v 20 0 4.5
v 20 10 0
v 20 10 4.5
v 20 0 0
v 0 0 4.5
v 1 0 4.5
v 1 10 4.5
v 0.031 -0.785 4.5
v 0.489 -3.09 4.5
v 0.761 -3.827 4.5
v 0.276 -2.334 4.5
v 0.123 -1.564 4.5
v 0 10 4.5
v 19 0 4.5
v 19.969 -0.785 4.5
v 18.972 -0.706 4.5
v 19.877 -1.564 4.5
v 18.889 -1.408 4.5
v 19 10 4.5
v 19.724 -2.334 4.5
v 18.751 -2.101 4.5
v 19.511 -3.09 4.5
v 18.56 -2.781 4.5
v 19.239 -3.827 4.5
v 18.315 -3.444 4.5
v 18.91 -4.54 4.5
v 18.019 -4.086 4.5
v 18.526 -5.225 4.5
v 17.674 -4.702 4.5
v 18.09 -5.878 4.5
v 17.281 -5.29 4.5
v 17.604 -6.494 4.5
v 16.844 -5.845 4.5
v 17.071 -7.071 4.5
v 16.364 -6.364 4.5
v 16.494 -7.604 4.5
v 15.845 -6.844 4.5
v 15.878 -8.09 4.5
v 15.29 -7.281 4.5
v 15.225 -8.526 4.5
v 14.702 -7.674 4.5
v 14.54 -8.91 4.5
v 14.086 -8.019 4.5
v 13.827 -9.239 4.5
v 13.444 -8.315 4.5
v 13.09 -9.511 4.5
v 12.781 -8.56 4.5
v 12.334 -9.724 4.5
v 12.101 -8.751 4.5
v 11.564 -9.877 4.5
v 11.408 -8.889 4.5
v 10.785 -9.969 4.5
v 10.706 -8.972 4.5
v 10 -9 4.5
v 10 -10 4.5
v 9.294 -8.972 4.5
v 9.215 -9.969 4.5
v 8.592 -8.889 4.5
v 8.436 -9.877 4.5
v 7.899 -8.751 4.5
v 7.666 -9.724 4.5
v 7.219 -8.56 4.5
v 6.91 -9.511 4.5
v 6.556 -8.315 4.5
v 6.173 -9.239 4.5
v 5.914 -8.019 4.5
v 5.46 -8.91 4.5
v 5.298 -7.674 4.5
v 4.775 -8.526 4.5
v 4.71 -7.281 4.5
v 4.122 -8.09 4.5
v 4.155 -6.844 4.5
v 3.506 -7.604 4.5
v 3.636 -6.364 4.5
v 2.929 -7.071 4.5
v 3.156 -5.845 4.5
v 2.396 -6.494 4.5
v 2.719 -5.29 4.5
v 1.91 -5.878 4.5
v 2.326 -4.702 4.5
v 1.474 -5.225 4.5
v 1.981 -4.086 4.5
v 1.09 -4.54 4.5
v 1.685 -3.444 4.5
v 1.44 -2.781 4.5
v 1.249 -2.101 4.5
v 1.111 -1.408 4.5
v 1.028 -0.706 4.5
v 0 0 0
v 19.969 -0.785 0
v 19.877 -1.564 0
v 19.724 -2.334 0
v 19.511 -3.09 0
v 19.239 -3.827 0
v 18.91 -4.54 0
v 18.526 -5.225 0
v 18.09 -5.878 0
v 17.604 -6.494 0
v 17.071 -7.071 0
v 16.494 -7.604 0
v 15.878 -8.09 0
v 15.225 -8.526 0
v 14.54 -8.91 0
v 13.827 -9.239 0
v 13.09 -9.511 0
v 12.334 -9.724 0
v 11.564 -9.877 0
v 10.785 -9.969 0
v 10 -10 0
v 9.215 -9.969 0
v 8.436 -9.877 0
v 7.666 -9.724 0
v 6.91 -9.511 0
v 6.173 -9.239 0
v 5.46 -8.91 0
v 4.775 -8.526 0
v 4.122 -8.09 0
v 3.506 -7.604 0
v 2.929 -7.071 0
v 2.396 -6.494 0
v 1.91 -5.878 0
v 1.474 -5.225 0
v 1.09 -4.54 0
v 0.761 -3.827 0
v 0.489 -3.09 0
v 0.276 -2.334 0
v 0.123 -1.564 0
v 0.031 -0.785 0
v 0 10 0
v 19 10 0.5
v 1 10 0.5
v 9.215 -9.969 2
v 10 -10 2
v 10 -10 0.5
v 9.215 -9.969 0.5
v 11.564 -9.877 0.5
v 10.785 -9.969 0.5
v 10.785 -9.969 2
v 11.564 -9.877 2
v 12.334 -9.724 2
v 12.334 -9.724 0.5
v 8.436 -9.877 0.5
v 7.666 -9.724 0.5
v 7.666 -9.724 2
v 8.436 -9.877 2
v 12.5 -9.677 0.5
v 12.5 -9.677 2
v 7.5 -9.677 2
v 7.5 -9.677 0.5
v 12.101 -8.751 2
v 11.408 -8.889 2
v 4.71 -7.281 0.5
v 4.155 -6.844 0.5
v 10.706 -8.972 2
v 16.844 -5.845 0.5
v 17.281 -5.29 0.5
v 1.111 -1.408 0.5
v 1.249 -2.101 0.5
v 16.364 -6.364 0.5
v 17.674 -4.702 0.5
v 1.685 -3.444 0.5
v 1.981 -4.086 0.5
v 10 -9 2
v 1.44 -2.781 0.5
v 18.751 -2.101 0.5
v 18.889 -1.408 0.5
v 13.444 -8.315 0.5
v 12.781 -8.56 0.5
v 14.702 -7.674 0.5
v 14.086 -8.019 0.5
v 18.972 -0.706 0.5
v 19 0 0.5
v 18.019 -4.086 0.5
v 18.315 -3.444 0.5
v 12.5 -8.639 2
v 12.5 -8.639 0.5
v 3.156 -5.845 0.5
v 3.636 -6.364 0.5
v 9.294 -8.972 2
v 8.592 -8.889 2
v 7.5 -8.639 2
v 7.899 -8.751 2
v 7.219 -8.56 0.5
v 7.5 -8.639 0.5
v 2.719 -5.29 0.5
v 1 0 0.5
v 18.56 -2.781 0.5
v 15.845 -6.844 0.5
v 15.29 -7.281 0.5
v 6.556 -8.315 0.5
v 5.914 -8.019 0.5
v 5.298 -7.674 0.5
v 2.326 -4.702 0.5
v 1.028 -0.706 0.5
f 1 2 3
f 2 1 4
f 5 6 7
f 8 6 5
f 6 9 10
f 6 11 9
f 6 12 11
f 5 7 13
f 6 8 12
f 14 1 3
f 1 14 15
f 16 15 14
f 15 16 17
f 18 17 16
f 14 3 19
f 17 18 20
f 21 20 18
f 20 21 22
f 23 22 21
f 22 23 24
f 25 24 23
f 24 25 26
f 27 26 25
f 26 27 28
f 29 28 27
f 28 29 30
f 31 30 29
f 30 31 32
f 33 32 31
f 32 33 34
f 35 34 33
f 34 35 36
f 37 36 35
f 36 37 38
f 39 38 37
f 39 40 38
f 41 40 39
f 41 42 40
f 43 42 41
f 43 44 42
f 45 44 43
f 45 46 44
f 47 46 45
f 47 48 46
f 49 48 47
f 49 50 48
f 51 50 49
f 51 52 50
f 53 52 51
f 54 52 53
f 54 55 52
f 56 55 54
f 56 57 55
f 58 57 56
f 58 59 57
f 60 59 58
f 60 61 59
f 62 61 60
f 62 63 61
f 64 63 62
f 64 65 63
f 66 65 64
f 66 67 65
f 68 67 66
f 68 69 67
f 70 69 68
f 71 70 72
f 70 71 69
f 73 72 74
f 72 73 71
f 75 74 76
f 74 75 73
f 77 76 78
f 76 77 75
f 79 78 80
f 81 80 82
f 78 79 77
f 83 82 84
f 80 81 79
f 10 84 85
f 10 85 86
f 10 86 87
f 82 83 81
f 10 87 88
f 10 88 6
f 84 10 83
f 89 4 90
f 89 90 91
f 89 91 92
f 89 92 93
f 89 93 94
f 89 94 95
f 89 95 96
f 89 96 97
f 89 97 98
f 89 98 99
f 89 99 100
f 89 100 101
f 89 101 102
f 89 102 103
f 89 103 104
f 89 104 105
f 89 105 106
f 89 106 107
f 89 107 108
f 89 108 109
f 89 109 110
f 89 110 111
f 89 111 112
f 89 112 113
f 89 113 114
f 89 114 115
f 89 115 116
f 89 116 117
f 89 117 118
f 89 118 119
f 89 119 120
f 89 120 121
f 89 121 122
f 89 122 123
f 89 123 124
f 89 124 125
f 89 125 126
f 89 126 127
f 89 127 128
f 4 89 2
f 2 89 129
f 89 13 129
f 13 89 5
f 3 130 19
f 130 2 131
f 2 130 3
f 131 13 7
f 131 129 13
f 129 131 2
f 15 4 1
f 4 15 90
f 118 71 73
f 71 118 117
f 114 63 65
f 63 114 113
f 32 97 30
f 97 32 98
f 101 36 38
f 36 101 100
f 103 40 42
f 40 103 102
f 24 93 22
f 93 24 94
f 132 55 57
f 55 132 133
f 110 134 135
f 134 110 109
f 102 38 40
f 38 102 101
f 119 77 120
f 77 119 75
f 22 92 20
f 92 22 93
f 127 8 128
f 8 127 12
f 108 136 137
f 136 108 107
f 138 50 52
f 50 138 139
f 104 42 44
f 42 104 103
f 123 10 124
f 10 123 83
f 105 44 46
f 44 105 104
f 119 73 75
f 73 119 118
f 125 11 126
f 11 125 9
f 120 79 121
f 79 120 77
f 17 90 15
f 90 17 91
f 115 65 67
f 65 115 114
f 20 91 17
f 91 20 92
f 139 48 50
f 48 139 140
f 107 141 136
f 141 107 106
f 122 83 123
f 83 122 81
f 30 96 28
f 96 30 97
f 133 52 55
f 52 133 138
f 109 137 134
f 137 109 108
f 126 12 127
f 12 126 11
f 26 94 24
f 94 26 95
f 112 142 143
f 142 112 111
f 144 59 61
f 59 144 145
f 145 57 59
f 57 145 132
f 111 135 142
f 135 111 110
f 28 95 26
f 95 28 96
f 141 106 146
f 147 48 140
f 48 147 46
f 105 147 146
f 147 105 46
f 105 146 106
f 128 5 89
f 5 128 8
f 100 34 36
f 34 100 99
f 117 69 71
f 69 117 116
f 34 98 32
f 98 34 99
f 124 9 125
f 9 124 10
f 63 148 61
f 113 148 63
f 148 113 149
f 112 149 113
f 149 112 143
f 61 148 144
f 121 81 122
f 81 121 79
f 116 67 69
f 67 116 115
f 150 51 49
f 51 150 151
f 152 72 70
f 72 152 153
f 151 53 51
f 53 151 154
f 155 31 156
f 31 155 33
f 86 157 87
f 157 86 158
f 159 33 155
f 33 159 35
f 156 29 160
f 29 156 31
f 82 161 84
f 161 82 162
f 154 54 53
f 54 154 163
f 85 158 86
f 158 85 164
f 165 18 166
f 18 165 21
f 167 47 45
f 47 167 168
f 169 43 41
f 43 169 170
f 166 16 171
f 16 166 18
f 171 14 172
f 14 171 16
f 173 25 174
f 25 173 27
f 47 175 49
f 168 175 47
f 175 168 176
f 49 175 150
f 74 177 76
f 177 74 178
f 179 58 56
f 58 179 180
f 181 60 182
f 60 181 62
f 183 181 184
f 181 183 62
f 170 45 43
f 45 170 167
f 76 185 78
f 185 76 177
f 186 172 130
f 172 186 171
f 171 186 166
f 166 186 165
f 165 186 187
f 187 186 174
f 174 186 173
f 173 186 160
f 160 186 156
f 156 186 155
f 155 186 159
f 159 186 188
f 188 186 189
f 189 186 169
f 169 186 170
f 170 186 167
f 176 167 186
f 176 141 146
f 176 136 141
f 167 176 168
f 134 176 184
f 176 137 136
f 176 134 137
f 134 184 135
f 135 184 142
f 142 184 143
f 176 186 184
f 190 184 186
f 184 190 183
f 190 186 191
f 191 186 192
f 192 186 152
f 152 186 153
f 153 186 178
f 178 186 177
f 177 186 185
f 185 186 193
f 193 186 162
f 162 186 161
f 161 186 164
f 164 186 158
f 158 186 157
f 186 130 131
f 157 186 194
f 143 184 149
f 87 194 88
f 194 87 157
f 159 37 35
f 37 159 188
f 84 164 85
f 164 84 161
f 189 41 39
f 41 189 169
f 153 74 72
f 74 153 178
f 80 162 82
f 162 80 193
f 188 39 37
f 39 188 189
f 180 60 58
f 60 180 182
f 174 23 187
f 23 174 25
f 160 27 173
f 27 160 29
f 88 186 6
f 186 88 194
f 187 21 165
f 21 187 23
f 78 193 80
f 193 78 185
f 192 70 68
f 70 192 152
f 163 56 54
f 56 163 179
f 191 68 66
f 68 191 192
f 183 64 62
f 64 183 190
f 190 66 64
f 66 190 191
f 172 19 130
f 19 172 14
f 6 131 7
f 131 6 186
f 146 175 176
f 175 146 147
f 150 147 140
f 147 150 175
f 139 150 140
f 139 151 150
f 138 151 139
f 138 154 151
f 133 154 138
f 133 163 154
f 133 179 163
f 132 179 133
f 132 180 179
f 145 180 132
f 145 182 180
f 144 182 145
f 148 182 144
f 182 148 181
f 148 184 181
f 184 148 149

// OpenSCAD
// file: oledPanel.scad
// Oled screen panel

// Screen dimensions (may vary a little)
screenX = 28.5;
screenY = 27.5;

// Dimensions between holes axis
xInterHole = 23.7;
yInterHole = 24.4;

// Dimensions of the window in the panel
xWindow = 27;
yWindow = 15;
yWindowoffset = 1.5;

// Some offset
xHoleCenter = 0.1;
yHoleCenter = 0;

//rWindowPanel(45, 45, 2, 6);
//windowPanel(45, 45, 2, 6);

module rWindowPanel(x, y, z, yOffset) {
  translate([y/2, x/2, 0])
    rotate(90, [0, 0, 1])
      translate([-x/2, -y/2, 0])
        windowPanel(x, y, z, yOffset);
}

module windowPanel(x, y, z, yOffset) {
  xPanel = x;
  yPanel = y;
  zPanel = z;
  
  difference() {
    oledPanel(xPanel, yPanel, zPanel, yOffset);
    translate([(xPanel - xWindow)/2, (yPanel - yWindow)/2 + yWindowoffset + yOffset, -zPanel/2]) {
      // opening
      cube([xWindow, yWindow, 2 * zPanel]);  
    }
  }
}


module oledPanel(xPanel, yPanel, zPanel, yOffset) {   
  xMargin = xPanel - xInterHole;
  yMargin = yPanel - yInterHole;
  difference() {
    union() {
      cube([xPanel, yPanel, zPanel]);  
      pillar(xHoleCenter, yHoleCenter + yOffset, xMargin, yMargin, zPanel);
      pillar(xHoleCenter + xInterHole, yHoleCenter + yOffset, xMargin, yMargin, zPanel);
      pillar(xHoleCenter, yHoleCenter + yInterHole + yOffset, xMargin, yMargin, zPanel);
      pillar(xHoleCenter + xInterHole, yHoleCenter + yInterHole + yOffset, xMargin, yMargin, zPanel);
    }
    // cut the base of pillars
    translate([(xMargin - yInterHole)/2,  yMargin/2+1 + yOffset, zPanel]) {
      cube([xInterHole *2, yInterHole - 2, 3]);
    }
  }
}

// To hold the Oled screen
module pillar(x, y, xMargin, yMargin, zPanel) {
  echo (x, y, xMargin, yMargin, zPanel);
  translate([x + xMargin/2, y + yMargin/2, zPanel]) {
    cylinder(d=1.6, h=5, $fn=50);
    cylinder(d=4, h=1.5, $fn=50);
  }
    
}

// Screen model to make simulations
module screen() {
  screenY2 = 19;
  z1 = 1.2;
  z2 = 1.5;
  sBottomOffset = 3.7;

  xMargin = screenX - xInterHole;
  yMargin = screenY - yInterHole;
  
  translate([0, sBottomOffset, 0]) {
    cube([screenX, screenY2, z2]);
  }
  translate([0, 0, z2]) {
    difference() {
      cube([screenX, screenY, z1]);
      hole(xHoleCenter, yHoleCenter, xMargin, yMargin, z1);
      hole(xHoleCenter + xInterHole, yHoleCenter, xMargin, yMargin, z1);
      hole(xHoleCenter, yHoleCenter + yInterHole, xMargin, yMargin, z1);
      hole(xHoleCenter + xInterHole, yHoleCenter + yInterHole, xMargin, yMargin, z1);
      // pin placeholders
      translate([(screenX - 11)/2, screenY-3, z1 - 0.1]) {
        cube([11, 2.6, 1]);
      }
    }
  }
}

module hole(x, y, xMargin, yMargin, z) {
  translate([x + xMargin/2, y + yMargin/2, -0.1]) {
    cylinder(d=1.9, h = z+0.2, $fn=20);
  }
  
}
// main file
include <oledPanel.scad>;


innerX = 41;
innerY = 41;
innerZ = 41;
wall = 2;

outerX = innerX + 2 * wall;
outerY = innerY + 2 * wall;
outerZ = innerZ + 2 * wall;

boardZ = 2.25;

leftHookY = 10;
leftHookZ = 0.7;
leftHookX = 1.5;

rightHookY = 5;
rightHookZ = 0.7;
rightHookX = 1.1;

indentX = wall;
indentY = 8;
indentZ = wall;

rail = 2;
corner = 4;

batteryBracket();

//cover();
// iotinator();
//closed();

module closed() {
  iotinator();
  translate([wall + coverTolerance/2, wall + coverTolerance/2, outerZ - wall]) {
    cover();
  }
}


module batteryBracket() {
  x = 20;
  x2 = 18;
  z = 4.5;
  difference() {
    union() {
      cube([x, x/2, z]);
      translate([x/2, 0, 0]) {
        cylinder(d=x, h=z, $fn=80);
      }
    }
    union() {
      translate([x/2, 0, 0.5]) {
        cylinder(d = x2, h = z, $fn = 80);
      }
      translate([(x - x2)/2, 0, 0.5]) {
        cube([x2, x2, z]);
      }
    }
    translate([(x - 5)/2, -x/2, 0.5]) {
      cube([5, 1.5, 1.5]);
    }
  }
}


module iotinator() {
  windowPanel(outerX, outerY,  wall, 4);  
  difference() {
    // outer cube
    cube([outerX, outerY, outerZ]);
    translate([wall, wall, -wall]) {
      // inner cube
      cube([innerX, innerY, innerZ + 4 * wall]);
    }
    
    // Small opening for the cover
    translate([innerX + wall -1 , (outerY - indentY)/2, outerZ-indentZ]) {
      cube([indentX + 2, indentY, indentZ+1]);
    }      
  }
  
  // bottom left rail
  translate([wall, wall + corner, 0])
    cube([rail, rail, innerZ-5]);
  // top left rail
  translate([wall, wall + corner + rail + boardZ, 0])
    cube([rail, rail, innerZ-5]);
  // bottom right rail
  translate([innerX + wall - rail , wall + corner, 0])
    cube([rail, rail, innerZ-5]);
  // top right rail
  translate([innerX + wall - rail , wall + corner + rail + boardZ, 0])
    cube([rail, rail, innerZ-5]);
  
  // bottom left corner
  translate([wall, wall, wall])
    cube([corner, corner, innerZ]);
  // top left corner
  translate([wall , innerY + wall - corner , wall])
    cube([corner, corner, innerZ]);
    
  // bottom right corner
  
  translate([innerX + wall - corner, wall, wall])
    cube([corner, corner, innerZ]);
  // top right corner
  translate([innerX + wall - corner, innerY + wall - corner, wall])
    cube([corner, corner, innerZ]);
  
  // left cover Hook
  translate([wall, (outerY - leftHookY)/2, outerZ-leftHookZ]) {
    cube([leftHookX, leftHookY, leftHookZ]);
  }
  
  color("red") {
    // bottom right cover Hook
    translate([outerX - rightHookX - wall, (outerY - rightHookY)/4, outerZ-rightHookZ ]) {
      cube([rightHookX, rightHookY, rightHookZ]);
    }
    // top right cover Hook
    translate([outerX - rightHookX - wall, (outerY - rightHookY) - (outerY - rightHookY)/4, outerZ-rightHookZ ]) {
      cube([rightHookX, rightHookY, rightHookZ]);
    }   
  }
}

coverTolerance = 0.4;
coverX = innerX - coverTolerance;
coverY = innerY - coverTolerance;
usbSocketX = 9;
usbSocketY = 5;
usbSocketYOffset = 9.6;

module cover() {
    union() {
      difference() {
        cube([coverX, coverY, wall - 0.1]);
        
        translate([0, (coverY - leftHookY - 0.6)/2, wall - leftHookZ - 0.2])
          cube([leftHookX +0.1, leftHookY + 0.6, rightHookZ + 2 ]);
        
        // bottom right cover Hook
        translate([coverX - rightHookX -0.2, (coverY - rightHookY - 0.6)/4 - (wall + coverTolerance)/2,  wall - rightHookZ - 0.2]) {
          cube([rightHookX+0.2, rightHookY+0.6, rightHookZ + 2]);
        }
        // top right cover Hook
        translate([coverX - rightHookX -0.2,  
                   (coverY - rightHookY -0.2) - (coverY - rightHookY - 0.6)/4  + (wall + coverTolerance)/2,
                    wall - rightHookZ - 0.2 ]) {
          cube([rightHookX+0.2, rightHookY+0.6, rightHookZ + 2]);
        }
        // usb socket
        translate([(coverX - usbSocketX)/2, usbSocketYOffset, -0.5]) {
          cube([usbSocketX, usbSocketY, wall + 1]);  
        }

      }
      translate([coverX , (coverY - indentY + 0.2)/2, 0.2]) {
        cube([indentX + 0.2, indentY - 0.2, wall - 0.2]);
      }
    }
  
  
}
